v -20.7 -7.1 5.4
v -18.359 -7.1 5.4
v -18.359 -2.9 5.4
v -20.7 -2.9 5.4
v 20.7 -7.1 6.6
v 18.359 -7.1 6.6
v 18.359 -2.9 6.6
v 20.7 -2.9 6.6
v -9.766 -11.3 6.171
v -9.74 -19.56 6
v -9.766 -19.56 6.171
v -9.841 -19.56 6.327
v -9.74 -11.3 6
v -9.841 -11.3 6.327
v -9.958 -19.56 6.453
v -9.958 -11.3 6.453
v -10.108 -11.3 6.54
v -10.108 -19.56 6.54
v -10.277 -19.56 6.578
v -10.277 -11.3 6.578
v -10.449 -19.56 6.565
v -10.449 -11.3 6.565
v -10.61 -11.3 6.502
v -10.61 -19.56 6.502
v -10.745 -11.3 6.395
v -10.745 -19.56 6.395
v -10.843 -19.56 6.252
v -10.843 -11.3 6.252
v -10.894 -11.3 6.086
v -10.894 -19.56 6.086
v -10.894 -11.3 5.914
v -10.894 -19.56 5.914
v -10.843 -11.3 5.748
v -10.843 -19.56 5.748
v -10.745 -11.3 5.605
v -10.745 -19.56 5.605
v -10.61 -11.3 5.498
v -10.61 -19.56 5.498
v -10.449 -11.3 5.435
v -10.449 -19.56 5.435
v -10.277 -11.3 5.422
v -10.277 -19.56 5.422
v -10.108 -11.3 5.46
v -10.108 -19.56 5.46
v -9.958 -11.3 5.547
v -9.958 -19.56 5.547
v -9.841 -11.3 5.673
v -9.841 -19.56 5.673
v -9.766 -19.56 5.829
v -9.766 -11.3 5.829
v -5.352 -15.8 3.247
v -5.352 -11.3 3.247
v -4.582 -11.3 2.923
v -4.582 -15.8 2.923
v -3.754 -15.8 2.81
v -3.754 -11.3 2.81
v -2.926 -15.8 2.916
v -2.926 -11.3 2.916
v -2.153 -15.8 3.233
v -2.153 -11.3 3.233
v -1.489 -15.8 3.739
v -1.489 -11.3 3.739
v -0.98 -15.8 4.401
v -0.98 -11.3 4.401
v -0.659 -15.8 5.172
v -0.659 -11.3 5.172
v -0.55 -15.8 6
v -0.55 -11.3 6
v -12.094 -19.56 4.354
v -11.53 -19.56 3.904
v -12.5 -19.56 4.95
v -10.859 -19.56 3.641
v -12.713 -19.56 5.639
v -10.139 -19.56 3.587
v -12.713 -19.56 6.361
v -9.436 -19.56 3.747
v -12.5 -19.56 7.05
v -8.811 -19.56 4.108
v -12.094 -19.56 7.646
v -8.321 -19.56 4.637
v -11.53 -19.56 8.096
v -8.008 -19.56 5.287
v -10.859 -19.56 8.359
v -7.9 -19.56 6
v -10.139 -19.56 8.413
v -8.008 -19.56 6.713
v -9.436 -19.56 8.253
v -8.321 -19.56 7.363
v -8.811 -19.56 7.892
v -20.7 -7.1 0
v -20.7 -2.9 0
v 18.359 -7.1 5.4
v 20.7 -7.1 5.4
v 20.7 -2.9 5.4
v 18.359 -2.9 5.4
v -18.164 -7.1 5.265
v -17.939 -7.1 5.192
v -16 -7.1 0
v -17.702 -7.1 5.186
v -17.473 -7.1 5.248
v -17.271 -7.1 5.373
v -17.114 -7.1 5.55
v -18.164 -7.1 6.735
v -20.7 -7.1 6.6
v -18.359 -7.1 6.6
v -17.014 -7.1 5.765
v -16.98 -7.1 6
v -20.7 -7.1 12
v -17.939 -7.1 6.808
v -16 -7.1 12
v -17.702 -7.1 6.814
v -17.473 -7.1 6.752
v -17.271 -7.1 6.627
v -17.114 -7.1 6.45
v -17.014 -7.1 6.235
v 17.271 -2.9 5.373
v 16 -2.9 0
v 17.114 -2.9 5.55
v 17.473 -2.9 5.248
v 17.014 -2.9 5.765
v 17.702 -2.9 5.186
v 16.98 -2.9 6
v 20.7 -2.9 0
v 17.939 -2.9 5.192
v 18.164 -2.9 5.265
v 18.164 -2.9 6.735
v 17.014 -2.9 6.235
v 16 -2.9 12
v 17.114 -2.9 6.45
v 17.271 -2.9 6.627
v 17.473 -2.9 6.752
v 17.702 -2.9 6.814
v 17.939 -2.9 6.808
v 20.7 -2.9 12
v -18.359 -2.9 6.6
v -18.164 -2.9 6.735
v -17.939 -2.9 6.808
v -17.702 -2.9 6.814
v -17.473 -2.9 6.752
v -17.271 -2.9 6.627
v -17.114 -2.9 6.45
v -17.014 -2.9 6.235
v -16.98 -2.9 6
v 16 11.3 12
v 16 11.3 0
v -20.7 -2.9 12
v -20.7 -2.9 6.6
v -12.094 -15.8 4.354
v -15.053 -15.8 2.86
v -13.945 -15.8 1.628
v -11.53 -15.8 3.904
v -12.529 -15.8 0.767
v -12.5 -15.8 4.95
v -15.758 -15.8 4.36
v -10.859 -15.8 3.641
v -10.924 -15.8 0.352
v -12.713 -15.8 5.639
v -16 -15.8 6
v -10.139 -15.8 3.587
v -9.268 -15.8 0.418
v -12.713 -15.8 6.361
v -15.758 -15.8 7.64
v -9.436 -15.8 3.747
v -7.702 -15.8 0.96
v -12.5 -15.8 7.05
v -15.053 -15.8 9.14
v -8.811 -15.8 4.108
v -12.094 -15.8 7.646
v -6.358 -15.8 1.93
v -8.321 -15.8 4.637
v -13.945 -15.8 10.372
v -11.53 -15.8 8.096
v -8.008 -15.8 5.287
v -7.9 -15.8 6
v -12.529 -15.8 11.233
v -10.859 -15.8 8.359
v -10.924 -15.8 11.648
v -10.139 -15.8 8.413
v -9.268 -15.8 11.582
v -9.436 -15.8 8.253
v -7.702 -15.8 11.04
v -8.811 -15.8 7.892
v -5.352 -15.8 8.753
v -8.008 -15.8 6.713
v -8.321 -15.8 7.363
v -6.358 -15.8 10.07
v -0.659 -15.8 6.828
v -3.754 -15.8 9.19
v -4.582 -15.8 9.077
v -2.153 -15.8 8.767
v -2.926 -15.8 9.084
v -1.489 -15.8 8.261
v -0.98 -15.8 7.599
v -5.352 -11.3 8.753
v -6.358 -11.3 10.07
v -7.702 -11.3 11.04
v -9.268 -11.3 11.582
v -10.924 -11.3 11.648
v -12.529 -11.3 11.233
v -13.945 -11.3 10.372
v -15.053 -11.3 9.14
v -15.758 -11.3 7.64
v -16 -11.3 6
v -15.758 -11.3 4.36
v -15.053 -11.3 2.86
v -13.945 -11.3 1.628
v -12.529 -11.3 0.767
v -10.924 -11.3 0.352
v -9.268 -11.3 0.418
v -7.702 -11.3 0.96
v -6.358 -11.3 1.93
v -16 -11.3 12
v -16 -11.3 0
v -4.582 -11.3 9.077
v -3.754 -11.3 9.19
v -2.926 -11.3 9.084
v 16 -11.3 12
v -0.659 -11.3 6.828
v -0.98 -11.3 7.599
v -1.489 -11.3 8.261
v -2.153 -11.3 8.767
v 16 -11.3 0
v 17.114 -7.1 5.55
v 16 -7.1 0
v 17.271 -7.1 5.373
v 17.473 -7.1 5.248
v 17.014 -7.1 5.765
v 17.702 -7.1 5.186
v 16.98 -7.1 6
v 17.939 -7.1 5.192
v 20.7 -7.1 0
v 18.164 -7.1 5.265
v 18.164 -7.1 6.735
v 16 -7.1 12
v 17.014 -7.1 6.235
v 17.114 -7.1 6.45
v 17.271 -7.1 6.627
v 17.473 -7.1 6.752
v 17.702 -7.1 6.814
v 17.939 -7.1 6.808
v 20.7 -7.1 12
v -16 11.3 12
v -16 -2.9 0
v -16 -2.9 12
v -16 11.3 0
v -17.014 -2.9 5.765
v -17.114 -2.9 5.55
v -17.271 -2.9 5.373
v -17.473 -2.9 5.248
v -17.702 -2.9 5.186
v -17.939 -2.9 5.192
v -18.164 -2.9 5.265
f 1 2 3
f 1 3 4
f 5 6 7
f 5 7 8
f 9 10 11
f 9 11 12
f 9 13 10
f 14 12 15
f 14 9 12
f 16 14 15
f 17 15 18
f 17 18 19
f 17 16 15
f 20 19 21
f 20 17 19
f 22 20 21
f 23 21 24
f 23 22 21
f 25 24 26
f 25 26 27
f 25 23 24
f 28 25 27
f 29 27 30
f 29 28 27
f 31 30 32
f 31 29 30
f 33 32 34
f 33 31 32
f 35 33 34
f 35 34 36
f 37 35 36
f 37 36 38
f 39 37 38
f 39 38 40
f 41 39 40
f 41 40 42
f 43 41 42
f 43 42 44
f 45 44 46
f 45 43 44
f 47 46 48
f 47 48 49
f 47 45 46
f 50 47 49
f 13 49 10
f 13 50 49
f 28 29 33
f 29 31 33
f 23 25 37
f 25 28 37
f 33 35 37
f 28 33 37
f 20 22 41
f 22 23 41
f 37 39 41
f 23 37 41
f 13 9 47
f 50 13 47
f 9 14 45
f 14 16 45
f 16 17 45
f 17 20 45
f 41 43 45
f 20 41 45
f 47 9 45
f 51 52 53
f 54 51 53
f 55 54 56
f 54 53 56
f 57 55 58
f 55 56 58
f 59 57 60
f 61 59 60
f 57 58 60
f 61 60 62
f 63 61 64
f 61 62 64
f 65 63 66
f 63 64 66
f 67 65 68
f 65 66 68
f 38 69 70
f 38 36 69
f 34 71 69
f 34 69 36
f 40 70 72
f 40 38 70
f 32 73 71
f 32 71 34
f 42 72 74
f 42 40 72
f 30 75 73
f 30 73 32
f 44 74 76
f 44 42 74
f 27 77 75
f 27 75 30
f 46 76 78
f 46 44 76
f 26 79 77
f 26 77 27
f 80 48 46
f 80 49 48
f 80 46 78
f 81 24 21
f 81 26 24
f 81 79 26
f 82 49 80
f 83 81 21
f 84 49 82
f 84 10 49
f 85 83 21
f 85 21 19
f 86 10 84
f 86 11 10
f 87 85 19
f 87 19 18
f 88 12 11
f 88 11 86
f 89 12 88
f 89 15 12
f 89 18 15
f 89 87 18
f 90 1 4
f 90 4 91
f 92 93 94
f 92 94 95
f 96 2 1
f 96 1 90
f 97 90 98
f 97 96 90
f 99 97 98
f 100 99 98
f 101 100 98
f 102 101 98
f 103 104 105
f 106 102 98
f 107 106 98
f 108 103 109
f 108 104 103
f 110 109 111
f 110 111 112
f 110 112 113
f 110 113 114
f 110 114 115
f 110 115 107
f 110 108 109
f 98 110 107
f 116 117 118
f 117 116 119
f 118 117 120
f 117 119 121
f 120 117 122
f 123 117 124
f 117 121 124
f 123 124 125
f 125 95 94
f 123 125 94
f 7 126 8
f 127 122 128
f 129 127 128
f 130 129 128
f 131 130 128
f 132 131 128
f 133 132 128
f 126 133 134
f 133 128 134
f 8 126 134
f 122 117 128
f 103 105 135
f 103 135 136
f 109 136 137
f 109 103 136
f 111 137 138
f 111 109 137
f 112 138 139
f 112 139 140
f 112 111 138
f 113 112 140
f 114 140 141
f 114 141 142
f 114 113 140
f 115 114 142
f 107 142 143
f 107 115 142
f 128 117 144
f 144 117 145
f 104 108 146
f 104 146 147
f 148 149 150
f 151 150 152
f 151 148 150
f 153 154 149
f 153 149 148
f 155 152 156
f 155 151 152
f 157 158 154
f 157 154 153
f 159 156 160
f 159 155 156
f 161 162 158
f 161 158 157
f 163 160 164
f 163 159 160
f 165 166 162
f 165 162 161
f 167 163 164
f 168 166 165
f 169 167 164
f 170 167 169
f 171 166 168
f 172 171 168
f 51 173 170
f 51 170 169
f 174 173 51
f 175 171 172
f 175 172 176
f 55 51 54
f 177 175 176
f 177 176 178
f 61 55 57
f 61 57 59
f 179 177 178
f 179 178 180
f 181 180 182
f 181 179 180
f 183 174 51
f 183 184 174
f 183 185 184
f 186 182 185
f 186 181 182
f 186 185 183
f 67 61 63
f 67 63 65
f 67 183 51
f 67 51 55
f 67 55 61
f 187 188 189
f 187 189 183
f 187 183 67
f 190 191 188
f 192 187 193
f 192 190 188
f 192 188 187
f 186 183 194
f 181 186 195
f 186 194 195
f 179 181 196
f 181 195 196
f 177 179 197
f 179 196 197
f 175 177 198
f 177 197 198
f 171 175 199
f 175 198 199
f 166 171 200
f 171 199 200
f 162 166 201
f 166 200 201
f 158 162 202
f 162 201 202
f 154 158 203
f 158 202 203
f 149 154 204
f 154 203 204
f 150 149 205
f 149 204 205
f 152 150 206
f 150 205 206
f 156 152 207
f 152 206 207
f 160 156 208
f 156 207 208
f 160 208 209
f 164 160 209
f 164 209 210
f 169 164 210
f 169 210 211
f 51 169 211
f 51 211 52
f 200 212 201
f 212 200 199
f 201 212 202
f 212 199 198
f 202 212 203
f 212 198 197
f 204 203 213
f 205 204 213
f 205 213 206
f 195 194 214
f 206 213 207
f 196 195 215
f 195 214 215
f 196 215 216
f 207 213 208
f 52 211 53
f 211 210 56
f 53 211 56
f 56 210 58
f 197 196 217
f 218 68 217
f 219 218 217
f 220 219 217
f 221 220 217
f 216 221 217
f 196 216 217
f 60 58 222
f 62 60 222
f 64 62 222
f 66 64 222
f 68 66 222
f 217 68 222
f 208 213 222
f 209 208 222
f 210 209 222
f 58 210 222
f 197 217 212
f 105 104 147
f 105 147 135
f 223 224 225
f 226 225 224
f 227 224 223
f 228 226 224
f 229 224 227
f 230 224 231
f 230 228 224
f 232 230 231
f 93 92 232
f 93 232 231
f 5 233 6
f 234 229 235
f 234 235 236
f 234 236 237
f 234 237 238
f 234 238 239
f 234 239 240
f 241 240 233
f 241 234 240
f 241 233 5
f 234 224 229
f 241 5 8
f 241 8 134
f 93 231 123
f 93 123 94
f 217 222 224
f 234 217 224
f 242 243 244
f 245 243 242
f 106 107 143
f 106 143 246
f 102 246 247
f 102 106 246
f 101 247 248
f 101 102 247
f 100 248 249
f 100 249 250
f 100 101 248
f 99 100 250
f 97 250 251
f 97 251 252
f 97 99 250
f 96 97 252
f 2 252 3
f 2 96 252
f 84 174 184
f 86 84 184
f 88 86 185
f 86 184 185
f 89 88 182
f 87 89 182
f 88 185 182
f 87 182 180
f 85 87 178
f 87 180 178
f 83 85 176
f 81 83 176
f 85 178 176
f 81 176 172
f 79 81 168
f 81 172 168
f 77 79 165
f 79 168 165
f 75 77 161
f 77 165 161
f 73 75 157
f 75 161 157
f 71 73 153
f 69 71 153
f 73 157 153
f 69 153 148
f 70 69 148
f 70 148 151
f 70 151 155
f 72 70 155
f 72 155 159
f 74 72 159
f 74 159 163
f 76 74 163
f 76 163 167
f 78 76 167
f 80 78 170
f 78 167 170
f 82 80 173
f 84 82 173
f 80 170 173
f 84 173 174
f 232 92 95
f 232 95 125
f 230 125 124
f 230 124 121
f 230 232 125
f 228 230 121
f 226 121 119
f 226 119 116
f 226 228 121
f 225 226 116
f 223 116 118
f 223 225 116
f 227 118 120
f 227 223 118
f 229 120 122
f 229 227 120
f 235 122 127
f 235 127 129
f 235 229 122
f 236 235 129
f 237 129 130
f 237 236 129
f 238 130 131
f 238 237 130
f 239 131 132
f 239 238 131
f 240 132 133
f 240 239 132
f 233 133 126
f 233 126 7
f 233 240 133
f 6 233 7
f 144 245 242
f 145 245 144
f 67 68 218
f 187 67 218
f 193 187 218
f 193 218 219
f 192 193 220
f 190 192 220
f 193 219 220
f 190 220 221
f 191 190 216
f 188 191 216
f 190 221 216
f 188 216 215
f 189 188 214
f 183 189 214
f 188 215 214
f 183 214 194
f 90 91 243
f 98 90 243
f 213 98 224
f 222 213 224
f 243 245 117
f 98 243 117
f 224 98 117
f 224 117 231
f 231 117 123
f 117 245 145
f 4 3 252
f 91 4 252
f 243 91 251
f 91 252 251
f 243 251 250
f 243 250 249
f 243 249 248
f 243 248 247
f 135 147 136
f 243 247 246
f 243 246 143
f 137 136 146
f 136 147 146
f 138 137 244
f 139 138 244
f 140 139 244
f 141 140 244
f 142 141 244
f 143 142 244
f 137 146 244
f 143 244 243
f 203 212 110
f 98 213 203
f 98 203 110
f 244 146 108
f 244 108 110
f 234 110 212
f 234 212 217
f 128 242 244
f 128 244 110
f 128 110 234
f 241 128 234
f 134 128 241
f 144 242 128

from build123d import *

# Parameters (mm, degrees)
F0_W     = 32
F0_H     = 22.6
F1_DEPTH = 12
F3_START = -4.2
F3_DEPTH = 4.2
F4_R     = 2.42
F4_R_2   = 0.58
F5_DEPTH = 4.5
F6_R     = 2.42
F6_R_2   = 0.58
F7_DEPTH = 3.76


with BuildPart() as f1:
    # F0 (on Top) → F1 (new body)
    with BuildSketch(Plane.XY):
        Rectangle(F0_W, F0_H)
    extrude(amount=F1_DEPTH)

    # F2 (on face) → F3 (join)
    with BuildSketch(Plane.XZ.offset(11.3).offset(F3_START)):
        with BuildLine():
            Line((20.7, 12), (16, 12))
            Line((16, 12), (16, 0))
            Line((16, 0), (20.7, 0))
            Line((20.7, 0), (20.7, 5.4))
            Line((20.7, 5.4), (18.3589275445, 5.4))
            ThreePointArc((18.3589275445, 5.4), (16.98, 6), (18.3589275445, 6.6))
            Line((18.3589275445, 6.6), (20.7, 6.6))
            Line((20.7, 6.6), (20.7, 12))
        make_face()
        with BuildLine():
            Line((-16, 12), (-20.7, 12))
            Line((-20.7, 12), (-20.7, 6.6))
            Line((-20.7, 6.6), (-18.3589275445, 6.6))
            ThreePointArc((-18.3589275445, 6.6), (-17.4728307674, 6.7519044442), (-16.98, 6))
            ThreePointArc((-16.98, 6), (-17.4728307674, 5.2480955558), (-18.3589275445, 5.4))
            Line((-18.3589275445, 5.4), (-20.7, 5.4))
            Line((-20.7, 5.4), (-20.7, 0))
            Line((-20.7, 0), (-16, 0))
            Line((-16, 0), (-16, 12))
        make_face()
    extrude(amount=-F3_DEPTH)

    # F4 (on face) → F5 (join)
    with BuildSketch(Plane.XZ.offset(11.3)):
        with BuildLine():
            ThreePointArc((-5.3517097264, 3.2470939432), (-4.8208051156, 4.5782913016), (-4.64, 6))
            ThreePointArc((-4.64, 6), (-4.8208051156, 7.4217086984), (-5.3517097264, 8.7529060568))
            ThreePointArc((-5.3517097264, 8.7529060568), (-6.93, 6), (-5.3517097264, 3.2470939432))
        make_face()
        with BuildLine():
            ThreePointArc((-5.3517097264, 8.7529060568), (-4.8208051156, 7.4217086984), (-4.64, 6))
            ThreePointArc((-4.64, 6), (-4.8208051156, 4.5782913016), (-5.3517097264, 3.2470939432))
            ThreePointArc((-5.3517097264, 3.2470939432), (-2.1533768606, 3.2325594833), (-0.55, 6))
            ThreePointArc((-0.55, 6), (-2.1533768606, 8.7674405167), (-5.3517097264, 8.7529060568))
        make_face()
        with BuildLine():
            ThreePointArc((-5.3517097264, 3.2470939432), (-6.93, 6), (-5.3517097264, 8.7529060568))
            ThreePointArc((-5.3517097264, 8.7529060568), (-16, 6), (-5.3517097264, 3.2470939432))
        make_face()
        with Locations((-10.32, 6)):
            Circle(F4_R, mode=Mode.SUBTRACT)
        with Locations((-10.32, 6)):
            Circle(F4_R)
        with Locations((-10.32, 6)):
            Circle(F4_R_2, mode=Mode.SUBTRACT)
    extrude(amount=F5_DEPTH)

    # F6 (on face) → F7 (join)
    with BuildSketch(Plane.XZ.offset(15.8)):
        with Locations((-10.32, 6)):
            Circle(F6_R)
        with Locations((-10.32, 6)):
            Circle(F6_R_2, mode=Mode.SUBTRACT)
    extrude(amount=F7_DEPTH)


solid = f1.part
